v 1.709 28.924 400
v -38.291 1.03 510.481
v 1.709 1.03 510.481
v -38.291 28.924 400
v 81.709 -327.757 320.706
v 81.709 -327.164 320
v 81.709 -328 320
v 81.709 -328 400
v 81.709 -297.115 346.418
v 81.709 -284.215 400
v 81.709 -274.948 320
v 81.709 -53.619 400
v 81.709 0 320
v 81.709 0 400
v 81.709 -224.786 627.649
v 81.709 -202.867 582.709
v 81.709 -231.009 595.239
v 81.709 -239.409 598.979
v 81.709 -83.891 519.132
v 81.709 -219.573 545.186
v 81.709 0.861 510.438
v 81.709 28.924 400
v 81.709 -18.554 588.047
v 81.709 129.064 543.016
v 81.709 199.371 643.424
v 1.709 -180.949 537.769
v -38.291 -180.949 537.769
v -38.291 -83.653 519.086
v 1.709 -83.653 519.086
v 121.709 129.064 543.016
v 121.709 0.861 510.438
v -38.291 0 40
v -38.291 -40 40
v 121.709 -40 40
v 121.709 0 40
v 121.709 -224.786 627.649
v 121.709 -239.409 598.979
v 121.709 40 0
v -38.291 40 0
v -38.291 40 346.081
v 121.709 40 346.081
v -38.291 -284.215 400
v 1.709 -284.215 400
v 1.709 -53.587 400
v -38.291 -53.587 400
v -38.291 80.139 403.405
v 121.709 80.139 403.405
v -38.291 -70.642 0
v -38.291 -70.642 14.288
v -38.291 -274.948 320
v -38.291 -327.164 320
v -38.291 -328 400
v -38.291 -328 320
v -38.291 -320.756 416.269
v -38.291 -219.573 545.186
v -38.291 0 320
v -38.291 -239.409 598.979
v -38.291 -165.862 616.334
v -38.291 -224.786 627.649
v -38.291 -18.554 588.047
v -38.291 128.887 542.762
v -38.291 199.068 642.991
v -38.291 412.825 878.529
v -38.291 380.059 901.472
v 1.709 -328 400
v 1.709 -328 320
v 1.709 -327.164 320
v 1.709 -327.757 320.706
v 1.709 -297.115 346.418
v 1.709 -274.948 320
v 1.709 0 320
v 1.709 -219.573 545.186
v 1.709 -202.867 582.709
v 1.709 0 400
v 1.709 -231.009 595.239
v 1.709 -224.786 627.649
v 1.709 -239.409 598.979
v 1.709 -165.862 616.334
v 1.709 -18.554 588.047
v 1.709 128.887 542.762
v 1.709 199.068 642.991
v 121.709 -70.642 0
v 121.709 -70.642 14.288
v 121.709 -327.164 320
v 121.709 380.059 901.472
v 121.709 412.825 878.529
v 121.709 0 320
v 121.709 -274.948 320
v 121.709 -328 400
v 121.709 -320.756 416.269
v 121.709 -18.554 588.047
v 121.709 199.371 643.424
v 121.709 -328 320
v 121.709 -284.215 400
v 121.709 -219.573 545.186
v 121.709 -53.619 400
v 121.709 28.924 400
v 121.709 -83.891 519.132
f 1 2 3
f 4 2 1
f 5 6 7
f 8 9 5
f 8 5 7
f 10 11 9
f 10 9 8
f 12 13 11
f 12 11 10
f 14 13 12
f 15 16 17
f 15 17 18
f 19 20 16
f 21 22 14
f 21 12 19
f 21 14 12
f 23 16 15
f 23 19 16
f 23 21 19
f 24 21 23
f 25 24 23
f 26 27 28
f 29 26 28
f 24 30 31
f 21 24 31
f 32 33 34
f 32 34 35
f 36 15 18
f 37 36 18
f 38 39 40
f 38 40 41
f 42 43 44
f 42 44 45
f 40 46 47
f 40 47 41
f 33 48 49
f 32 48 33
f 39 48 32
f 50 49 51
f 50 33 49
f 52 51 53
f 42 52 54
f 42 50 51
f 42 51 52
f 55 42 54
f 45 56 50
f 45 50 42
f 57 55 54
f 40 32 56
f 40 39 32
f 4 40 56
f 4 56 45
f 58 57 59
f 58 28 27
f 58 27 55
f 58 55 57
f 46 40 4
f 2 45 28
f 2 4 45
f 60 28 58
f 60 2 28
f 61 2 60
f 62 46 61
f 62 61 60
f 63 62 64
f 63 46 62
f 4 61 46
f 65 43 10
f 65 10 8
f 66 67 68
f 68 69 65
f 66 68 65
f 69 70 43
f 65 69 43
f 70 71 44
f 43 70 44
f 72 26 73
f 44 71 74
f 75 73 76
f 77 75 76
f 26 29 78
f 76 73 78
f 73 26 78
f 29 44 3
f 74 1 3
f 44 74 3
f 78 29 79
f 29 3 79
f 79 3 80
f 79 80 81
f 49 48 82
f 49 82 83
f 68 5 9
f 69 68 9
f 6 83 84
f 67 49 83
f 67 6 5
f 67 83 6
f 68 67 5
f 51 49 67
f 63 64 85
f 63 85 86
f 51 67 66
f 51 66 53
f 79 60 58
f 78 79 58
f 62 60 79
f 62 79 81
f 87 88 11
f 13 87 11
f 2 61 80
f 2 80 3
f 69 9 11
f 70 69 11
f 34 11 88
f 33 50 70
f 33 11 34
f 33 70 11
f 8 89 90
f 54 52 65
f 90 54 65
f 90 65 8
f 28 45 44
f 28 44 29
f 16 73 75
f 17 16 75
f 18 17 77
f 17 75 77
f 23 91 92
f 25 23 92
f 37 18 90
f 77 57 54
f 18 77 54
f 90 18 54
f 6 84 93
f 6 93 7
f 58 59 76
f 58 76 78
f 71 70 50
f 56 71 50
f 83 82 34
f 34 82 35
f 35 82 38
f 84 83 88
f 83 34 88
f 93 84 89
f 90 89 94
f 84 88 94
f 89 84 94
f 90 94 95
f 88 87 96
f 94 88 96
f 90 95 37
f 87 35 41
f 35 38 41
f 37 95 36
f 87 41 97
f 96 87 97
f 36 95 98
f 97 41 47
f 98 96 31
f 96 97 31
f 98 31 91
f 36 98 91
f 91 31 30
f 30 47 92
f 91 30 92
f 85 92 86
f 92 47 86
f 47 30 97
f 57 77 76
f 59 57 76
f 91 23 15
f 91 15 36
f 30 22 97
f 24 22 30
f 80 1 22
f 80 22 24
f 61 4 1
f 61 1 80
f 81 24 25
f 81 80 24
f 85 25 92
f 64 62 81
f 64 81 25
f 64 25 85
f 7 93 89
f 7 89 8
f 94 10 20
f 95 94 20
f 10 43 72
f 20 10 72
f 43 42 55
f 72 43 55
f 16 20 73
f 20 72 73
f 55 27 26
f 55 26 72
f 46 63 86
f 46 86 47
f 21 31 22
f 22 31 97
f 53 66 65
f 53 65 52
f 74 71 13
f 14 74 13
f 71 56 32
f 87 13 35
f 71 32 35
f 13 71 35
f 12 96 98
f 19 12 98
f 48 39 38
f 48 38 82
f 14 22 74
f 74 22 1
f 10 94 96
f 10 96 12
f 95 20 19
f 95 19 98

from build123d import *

# Parameters (mm, degrees)
SKETCH_1_W       = 160
SKETCH_1_H       = 40
EXTRUDE_1_DEPTH  = 400
EXTRUDE_6_DEPTH  = 160
SKETCH_11_W      = 40
SKETCH_11_H      = 40
EXTRUDE_7_DEPTH  = 160
EXTRUDE_11_DEPTH = 160
SKETCH_17_W      = 40
SKETCH_17_H      = 80
EXTRUDE_13_DEPTH = 328
EXTRUDE_17_DEPTH = 160
EXTRUDE_18_DEPTH = 40
SKETCH_29_W      = 40
SKETCH_29_H      = 210
EXTRUDE_19_DEPTH = 80
EXTRUDE_20_DEPTH = 40
EXTRUDE_21_DEPTH = 40
EXTRUDE_22_DEPTH = 40


with BuildPart() as part:
    # Эскиз1 → Бобышка-Вытянуть1 (new body)
    with BuildSketch(Plane.XY):
        with Locations((41.709401709, 20)):
            Rectangle(SKETCH_1_W, SKETCH_1_H)
    extrude(amount=EXTRUDE_1_DEPTH)

    # Эскиз8 → Бобышка-Вытянуть6 (add)
    with BuildSketch(Plane.ZY.offset(38.290598291)):
        Polygon((403.40525509, 80.13918018), (346.080564925, 40), (400, 40), (400, 28.923811345), (901.472451167, 380.058601857), (878.529393713, 412.824683628), align=None)
    extrude(amount=-EXTRUDE_6_DEPTH)

    # Эскиз11 → Бобышка-Вытянуть7 (add)
    with BuildSketch(Plane.ZY.offset(38.290598291)):
        with Locations((20, -20)):
            Rectangle(SKETCH_11_W, SKETCH_11_H)
    extrude(amount=-EXTRUDE_7_DEPTH)

    # Эскиз12 → Бобышка-Вытянуть11 (add)
    with BuildSketch(Plane.ZY.offset(38.290598291)):
        Polygon((346.417777248, -297.115043875), (40, -40), (0, -40), (0, -70.641777725), (14.288495613, -70.641777725), (320.70627286, -327.756821599), align=None)
    extrude(amount=-EXTRUDE_11_DEPTH)

    # Эскиз17 → Бобышка-Вытянуть13 (add)
    with BuildSketch(Plane(origin=(0, 0, 0), x_dir=(-1, 0, 0), z_dir=(0, -1, 0))):
        with Locations((18.290598291, -360)):
            Rectangle(SKETCH_17_W, SKETCH_17_H)
        with Locations((-101.709401709, -360)):
            Rectangle(SKETCH_17_W, SKETCH_17_H)
    extrude(amount=EXTRUDE_13_DEPTH)

    # Эскиз26 → Бобышка-Вытянуть17 (add)
    with BuildSketch(Plane.ZY.offset(38.290598291)):
        Polygon((400, -284.21454886), (400, -328), (416.269465723, -320.756367165), align=None)
        Polygon((582.709091529, -202.867220245), (598.978557252, -239.40903855), (416.269465723, -320.756367165), (400, -284.21454886), align=None)
    extrude(amount=-EXTRUDE_17_DEPTH)

    # Эскиз27 → Бобышка-Вытянуть18 (add)
    with BuildSketch(Plane.ZY.offset(38.290598291)):
        Polygon((509.482462661, -33.639974138), (588.04709667, -18.55361331), (616.334023223, -165.862302077), (537.769389214, -180.948662905), align=None)
        Polygon((545.18630579, -219.573440808), (582.709091529, -202.867220245), (595.238756951, -231.009309548), (627.648793843, -224.785777584), (616.334023223, -165.862302077), (537.769389214, -180.948662905), align=None)
        Polygon((627.648793843, -224.785777584), (595.238756951, -231.009309548), (598.978557252, -239.40903855), align=None)
    extrude(amount=-EXTRUDE_18_DEPTH)

    # Эскиз29 → Бобышка-Вытянуть19 (add)
    with BuildSketch(Plane(origin=(0, 108.244163778, 563.698774535), x_dir=(1, 0, 0), z_dir=(0, 0.18857951034822912, 0.9820579251127819))):
        with Locations((101.709401709, -234.114356543)):
            Rectangle(SKETCH_29_W, SKETCH_29_H)
    extrude(amount=-EXTRUDE_19_DEPTH)

    # Эскиз33 → Бобышка-Вытянуть20 (add)
    with BuildSketch(Plane(origin=(121.709401709, 0, 0), x_dir=(0, 0, -1), z_dir=(1, 0, 0))):
        Polygon((-627.648793843, -224.785777584), (-598.978557252, -239.40903855), (-595.238756951, -231.009309548), align=None)
    extrude(amount=-EXTRUDE_20_DEPTH)

    # Эскиз34 → Бобышка-Вытянуть21 (add)
    with BuildSketch(Plane.ZY.offset(38.290598291)):
        Polygon((400, -53.586571178), (490.897529352, -76.536037974), (510.481100679, 1.029958017), (400, 28.923811345), align=None)
        Polygon((510.481100679, 1.029958017), (490.897529352, -76.536037974), (514.961644961, -62.173691245), (509.482462661, -33.639974138), (588.04709667, -18.55361331), align=None)
        Polygon((514.961644961, -62.173691245), (490.897529352, -76.536037974), (519.0862075, -83.653009555), align=None)
        Polygon((542.761910091, 128.886776961), (510.481100679, 1.029958017), (588.04709667, -18.55361331), (642.991448698, 199.068255444), align=None)
    extrude(amount=-EXTRUDE_21_DEPTH)

    # Эскиз35 → Бобышка-Вытянуть22 (add)
    with BuildSketch(Plane(origin=(121.709401709, 0, 0), x_dir=(0, 0, -1), z_dir=(1, 0, 0))):
        Polygon((-588.04709667, -18.55361331), (-643.423626769, 199.370869787), (-543.015704436, 129.064485674), (-510.437956524, 0.860554126), (-400, 28.923811345), (-400, -53.618639699), (-519.131929063, -83.891111895), (-509.482462661, -33.639974138), align=None)
    extrude(amount=-EXTRUDE_22_DEPTH)


solid = part.part
